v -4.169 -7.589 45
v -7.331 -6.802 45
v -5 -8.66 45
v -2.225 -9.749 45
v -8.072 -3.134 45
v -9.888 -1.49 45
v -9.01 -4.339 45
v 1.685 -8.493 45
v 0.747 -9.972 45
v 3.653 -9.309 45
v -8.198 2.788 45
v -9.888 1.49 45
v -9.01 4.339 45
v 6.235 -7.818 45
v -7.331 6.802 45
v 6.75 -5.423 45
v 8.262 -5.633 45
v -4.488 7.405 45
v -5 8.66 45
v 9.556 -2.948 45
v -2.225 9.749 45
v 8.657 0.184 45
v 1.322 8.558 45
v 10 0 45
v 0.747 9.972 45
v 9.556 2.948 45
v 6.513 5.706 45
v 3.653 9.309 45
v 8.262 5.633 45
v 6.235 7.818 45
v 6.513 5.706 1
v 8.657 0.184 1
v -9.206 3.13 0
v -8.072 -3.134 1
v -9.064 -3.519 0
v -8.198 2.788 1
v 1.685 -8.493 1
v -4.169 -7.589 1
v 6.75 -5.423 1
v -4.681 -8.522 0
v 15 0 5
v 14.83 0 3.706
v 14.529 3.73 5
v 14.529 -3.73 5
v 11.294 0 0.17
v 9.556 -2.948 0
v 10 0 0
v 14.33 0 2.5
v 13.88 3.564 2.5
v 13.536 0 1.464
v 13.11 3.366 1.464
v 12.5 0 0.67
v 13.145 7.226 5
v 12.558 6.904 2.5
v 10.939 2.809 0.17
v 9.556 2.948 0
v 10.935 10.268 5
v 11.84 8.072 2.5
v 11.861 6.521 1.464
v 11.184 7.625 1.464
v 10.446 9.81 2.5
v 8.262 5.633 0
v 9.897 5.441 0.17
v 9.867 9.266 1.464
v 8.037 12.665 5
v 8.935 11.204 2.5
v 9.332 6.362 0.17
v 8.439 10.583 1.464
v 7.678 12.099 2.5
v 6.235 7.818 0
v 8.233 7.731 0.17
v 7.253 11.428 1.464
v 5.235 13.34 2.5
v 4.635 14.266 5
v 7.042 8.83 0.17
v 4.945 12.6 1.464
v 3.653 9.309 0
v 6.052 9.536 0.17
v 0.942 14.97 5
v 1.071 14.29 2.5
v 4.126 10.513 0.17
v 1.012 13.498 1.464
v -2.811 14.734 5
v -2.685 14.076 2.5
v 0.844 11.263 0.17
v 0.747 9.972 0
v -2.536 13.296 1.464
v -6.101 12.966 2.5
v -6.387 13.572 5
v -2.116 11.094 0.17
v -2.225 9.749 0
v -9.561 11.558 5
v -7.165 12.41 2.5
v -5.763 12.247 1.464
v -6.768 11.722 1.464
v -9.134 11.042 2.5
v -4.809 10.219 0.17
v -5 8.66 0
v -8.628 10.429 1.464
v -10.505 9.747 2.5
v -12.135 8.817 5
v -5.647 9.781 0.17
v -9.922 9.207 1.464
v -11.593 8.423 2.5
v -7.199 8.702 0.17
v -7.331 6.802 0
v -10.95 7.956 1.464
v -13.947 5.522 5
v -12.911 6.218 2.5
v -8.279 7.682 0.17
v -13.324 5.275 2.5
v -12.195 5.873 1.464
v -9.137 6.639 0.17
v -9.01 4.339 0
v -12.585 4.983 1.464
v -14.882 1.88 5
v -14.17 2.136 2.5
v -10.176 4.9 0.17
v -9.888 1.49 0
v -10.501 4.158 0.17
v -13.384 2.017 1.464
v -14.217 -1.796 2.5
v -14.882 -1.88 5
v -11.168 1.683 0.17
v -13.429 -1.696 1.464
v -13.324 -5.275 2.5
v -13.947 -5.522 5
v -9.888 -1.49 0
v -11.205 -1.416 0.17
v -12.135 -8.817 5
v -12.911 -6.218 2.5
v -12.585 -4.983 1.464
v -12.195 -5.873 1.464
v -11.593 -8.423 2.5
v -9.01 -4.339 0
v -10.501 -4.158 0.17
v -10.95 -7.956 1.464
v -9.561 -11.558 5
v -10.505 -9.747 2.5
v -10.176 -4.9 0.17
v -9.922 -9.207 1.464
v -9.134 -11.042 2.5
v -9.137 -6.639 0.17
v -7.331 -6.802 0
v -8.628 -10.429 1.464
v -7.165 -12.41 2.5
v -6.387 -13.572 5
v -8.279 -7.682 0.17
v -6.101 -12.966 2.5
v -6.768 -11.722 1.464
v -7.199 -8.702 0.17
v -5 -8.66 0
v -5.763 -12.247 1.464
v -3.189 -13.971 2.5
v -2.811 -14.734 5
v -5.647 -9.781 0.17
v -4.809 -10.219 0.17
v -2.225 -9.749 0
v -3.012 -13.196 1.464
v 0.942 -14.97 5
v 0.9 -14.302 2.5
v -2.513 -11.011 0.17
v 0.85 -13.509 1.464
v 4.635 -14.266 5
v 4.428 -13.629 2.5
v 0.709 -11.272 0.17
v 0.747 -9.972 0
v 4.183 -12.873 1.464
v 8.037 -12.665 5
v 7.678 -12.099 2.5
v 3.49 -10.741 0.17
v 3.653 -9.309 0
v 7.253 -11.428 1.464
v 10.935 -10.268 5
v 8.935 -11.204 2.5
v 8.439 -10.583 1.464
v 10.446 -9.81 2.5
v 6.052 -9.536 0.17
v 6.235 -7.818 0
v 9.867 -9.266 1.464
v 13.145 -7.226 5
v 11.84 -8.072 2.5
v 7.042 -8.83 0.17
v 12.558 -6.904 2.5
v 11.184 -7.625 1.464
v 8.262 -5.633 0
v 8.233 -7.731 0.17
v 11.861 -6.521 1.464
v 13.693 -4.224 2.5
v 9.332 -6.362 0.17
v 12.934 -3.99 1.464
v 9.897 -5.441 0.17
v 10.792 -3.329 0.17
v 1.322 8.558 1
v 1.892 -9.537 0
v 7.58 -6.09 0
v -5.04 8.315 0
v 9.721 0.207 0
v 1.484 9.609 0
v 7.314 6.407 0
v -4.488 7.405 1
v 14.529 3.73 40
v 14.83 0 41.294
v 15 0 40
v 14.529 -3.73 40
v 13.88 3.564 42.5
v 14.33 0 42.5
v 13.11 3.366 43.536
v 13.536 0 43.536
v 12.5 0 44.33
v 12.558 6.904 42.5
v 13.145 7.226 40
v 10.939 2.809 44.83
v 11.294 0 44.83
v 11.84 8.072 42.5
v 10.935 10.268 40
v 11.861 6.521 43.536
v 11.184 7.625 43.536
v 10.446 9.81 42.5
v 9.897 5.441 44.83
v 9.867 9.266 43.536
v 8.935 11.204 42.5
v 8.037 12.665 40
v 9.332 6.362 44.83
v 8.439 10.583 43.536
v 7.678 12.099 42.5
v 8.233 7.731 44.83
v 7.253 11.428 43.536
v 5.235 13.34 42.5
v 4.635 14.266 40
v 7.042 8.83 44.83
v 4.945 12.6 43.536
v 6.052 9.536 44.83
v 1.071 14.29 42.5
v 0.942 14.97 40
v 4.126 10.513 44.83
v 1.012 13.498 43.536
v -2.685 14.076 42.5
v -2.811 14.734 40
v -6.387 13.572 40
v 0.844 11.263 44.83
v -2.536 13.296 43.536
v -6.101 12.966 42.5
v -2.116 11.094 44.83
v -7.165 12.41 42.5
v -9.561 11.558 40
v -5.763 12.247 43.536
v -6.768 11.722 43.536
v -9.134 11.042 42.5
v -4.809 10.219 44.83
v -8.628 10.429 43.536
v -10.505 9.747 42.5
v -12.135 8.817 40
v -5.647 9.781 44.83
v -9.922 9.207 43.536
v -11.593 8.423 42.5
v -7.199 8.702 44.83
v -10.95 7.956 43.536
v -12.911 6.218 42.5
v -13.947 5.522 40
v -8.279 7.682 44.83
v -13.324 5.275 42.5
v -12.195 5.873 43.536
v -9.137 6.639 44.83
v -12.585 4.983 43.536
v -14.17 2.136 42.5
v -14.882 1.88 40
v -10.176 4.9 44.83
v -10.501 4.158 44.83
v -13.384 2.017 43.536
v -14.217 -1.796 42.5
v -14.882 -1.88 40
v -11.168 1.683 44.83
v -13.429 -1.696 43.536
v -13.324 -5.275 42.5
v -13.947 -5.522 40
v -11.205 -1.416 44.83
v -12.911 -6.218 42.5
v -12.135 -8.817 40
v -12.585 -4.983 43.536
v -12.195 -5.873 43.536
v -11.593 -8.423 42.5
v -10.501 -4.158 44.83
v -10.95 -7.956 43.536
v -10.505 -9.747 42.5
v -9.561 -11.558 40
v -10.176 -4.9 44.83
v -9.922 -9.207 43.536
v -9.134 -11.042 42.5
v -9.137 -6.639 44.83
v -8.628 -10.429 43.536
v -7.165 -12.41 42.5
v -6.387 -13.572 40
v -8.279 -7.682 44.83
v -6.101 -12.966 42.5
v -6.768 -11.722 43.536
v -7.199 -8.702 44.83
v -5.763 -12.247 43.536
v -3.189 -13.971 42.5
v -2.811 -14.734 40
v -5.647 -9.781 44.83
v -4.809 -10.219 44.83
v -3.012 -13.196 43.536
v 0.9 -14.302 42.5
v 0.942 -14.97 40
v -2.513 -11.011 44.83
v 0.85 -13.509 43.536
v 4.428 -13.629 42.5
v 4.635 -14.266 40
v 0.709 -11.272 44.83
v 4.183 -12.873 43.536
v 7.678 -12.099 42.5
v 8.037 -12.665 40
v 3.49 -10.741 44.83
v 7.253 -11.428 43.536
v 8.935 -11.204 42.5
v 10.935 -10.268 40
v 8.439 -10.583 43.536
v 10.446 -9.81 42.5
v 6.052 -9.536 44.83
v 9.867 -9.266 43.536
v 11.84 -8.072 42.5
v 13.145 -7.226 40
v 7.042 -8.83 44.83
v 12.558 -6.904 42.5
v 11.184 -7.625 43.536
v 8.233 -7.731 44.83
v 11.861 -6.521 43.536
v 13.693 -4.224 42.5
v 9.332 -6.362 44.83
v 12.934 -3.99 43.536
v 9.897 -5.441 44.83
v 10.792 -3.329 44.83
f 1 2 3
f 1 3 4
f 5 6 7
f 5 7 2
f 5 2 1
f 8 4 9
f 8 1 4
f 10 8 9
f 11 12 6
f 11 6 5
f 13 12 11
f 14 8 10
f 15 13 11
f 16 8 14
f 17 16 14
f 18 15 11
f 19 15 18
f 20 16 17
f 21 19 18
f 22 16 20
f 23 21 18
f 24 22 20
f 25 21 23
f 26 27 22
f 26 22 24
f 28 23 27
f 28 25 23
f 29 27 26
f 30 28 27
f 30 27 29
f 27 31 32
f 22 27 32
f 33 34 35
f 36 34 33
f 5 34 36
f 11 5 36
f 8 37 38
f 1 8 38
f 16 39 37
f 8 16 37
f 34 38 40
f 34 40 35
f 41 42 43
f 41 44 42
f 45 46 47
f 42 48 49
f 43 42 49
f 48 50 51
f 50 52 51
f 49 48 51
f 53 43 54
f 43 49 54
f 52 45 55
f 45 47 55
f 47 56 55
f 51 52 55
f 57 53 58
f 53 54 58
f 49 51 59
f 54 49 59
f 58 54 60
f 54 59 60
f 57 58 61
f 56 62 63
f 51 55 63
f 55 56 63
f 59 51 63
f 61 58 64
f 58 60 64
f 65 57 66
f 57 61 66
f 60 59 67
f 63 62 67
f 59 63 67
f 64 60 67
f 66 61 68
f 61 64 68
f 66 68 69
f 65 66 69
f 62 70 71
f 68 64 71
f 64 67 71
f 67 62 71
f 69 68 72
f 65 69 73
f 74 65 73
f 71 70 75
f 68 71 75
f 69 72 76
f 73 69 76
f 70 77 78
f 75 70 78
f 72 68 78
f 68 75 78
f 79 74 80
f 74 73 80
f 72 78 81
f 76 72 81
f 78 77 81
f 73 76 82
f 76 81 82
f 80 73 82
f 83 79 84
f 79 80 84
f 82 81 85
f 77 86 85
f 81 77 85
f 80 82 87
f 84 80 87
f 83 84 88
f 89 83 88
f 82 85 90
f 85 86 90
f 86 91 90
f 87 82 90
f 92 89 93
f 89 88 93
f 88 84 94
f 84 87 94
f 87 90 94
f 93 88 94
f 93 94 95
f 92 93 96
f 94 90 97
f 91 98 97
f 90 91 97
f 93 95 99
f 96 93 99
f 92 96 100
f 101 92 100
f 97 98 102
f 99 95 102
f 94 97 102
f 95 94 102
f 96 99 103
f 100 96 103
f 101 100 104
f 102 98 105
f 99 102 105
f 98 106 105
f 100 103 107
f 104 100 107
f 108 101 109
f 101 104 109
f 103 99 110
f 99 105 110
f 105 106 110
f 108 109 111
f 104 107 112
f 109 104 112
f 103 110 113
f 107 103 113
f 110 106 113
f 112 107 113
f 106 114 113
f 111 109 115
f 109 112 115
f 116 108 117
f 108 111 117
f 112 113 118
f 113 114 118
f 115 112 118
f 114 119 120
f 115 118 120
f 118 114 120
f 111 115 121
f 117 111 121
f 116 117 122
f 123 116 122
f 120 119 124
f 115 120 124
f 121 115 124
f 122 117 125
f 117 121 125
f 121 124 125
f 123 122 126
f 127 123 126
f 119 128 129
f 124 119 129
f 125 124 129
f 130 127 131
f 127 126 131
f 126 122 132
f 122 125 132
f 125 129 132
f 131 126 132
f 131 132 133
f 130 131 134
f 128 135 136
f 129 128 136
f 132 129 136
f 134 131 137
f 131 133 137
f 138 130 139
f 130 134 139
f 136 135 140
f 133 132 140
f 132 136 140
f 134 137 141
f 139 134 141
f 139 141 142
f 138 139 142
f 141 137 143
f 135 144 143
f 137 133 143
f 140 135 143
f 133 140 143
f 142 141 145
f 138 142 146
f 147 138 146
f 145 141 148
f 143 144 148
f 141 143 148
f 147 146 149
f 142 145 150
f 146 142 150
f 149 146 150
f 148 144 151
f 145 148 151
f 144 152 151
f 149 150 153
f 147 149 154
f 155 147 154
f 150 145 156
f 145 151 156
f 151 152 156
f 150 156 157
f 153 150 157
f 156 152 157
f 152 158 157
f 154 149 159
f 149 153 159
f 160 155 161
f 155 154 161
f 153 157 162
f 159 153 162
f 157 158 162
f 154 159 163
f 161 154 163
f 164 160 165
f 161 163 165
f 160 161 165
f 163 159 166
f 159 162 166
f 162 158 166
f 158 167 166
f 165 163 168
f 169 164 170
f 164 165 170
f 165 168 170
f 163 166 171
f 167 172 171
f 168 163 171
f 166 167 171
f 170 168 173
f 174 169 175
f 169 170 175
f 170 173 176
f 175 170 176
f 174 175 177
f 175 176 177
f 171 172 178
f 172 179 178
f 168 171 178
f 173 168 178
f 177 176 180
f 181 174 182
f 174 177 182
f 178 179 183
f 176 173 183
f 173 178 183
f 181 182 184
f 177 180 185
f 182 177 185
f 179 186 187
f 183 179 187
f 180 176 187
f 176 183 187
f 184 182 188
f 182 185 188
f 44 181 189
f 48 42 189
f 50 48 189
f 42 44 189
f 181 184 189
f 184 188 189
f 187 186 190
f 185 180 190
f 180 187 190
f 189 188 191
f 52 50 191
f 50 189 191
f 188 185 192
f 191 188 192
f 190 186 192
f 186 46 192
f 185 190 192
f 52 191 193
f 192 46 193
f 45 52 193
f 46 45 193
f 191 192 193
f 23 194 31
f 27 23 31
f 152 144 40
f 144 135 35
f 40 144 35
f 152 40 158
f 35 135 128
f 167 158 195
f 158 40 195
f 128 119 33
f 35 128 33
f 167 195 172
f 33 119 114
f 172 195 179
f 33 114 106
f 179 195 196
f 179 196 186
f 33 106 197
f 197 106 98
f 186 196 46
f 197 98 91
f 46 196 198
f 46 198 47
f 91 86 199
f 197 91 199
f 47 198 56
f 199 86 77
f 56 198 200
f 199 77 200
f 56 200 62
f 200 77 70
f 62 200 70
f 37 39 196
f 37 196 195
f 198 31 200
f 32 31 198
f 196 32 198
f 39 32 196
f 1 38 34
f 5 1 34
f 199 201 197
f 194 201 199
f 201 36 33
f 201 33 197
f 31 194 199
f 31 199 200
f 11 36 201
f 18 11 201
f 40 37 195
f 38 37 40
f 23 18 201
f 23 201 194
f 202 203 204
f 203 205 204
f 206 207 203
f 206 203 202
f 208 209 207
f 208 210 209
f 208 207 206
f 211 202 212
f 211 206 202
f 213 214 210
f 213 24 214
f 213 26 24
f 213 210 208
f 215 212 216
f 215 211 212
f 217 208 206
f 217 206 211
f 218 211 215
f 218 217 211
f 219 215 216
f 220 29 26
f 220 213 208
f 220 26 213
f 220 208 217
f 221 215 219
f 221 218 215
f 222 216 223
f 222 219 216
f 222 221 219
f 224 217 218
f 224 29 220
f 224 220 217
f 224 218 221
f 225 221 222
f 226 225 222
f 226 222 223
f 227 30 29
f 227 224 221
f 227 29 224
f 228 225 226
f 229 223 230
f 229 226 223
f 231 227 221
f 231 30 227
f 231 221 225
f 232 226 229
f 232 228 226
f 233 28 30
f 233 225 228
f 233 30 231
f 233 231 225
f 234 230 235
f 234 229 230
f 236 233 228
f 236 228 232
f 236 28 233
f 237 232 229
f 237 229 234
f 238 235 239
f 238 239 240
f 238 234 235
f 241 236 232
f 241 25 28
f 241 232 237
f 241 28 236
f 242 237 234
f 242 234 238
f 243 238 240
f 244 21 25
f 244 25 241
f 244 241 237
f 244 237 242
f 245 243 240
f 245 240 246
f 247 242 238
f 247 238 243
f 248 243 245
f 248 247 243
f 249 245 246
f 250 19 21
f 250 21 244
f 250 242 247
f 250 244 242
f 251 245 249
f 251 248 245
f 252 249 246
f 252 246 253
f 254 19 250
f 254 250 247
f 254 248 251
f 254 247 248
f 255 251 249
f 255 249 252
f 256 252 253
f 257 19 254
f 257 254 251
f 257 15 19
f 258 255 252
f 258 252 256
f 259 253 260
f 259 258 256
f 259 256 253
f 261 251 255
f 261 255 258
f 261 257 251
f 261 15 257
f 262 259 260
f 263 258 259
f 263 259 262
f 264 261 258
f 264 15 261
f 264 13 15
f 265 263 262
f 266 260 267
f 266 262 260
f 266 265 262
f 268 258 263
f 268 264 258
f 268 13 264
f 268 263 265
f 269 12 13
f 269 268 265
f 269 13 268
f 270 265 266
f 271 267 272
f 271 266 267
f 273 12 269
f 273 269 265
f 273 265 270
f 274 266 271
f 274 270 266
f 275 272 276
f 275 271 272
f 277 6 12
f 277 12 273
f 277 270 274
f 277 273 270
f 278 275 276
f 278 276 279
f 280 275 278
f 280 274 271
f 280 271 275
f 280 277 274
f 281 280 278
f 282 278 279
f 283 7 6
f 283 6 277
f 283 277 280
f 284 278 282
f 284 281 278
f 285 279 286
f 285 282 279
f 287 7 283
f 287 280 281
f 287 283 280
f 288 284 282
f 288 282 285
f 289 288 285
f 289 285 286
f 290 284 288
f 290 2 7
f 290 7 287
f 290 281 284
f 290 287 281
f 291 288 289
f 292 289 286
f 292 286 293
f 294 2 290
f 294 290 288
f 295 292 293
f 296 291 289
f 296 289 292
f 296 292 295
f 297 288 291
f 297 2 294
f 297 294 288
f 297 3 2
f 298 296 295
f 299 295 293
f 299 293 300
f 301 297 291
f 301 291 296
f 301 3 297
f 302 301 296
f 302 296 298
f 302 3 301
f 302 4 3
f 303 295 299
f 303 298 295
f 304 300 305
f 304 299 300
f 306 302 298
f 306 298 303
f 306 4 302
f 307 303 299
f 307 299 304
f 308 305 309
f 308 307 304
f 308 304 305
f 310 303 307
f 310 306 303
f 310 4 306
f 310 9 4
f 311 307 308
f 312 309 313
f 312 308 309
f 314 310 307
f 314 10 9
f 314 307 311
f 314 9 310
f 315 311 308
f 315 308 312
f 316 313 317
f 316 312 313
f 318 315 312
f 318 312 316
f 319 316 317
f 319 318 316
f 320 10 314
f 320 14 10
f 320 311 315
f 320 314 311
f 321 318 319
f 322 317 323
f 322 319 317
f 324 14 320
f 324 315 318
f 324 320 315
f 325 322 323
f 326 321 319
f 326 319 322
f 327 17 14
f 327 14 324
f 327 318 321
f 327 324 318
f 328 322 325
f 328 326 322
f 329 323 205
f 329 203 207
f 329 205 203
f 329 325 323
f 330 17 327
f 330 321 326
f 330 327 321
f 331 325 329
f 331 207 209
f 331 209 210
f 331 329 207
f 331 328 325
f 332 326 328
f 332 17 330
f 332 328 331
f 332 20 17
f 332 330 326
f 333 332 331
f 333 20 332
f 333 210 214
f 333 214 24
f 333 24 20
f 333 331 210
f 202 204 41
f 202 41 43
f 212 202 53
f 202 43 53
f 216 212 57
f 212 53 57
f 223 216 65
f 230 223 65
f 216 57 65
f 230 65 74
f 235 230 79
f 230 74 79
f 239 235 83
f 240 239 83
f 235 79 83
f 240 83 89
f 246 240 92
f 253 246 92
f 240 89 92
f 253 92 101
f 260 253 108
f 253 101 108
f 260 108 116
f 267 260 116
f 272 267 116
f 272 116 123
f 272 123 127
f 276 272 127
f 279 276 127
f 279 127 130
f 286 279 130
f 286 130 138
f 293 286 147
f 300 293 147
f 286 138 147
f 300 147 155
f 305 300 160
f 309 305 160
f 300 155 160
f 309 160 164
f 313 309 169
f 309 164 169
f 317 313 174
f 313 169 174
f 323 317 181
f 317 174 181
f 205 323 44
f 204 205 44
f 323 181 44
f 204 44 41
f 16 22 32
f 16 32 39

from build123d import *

# Parameters (mm, degrees)
F0_R     = 15
F1_DEPTH = 45
F2_R     = 5
F3_SIZE  = 1


with BuildPart() as f1:
    # F0 (on Top) → F1 (new body)
    with BuildSketch(Plane.XY):
        Circle(F0_R)
        Polygon((-4.488197, 7.405002), (1.321685, 8.557517), (6.513136, 5.705876), (8.657018, 0.184391), (6.750185, -5.423372), (1.684866, -8.493479), (-4.168821, -7.589393), (-8.07187, -3.134146), (-8.198001, 2.787603), align=None, mode=Mode.SUBTRACT)
    extrude(amount=F1_DEPTH)

    # F2
    f2_edges = [f1.edges().sort_by_distance(p)[0] for p in [
        (-15, 0, 45),
        (-15, 0, 0),
    ]]
    fillet(f2_edges, radius=F2_R)

    # F3
    f3_edges = [f1.edges().sort_by_distance(p)[0] for p in [
        (4.217525, -6.958425, 0),
        (-1.241978, -8.041436, 0),
        (-6.120346, -5.361769, 0),
        (-8.134936, -0.173271, 0),
        (-6.343099, 5.096302, 0),
        (-1.583256, 7.98126, 0),
        (3.917411, 7.131697, 0),
        (7.585077, 2.945134, 0),
        (7.703601, -2.61949, 0),
    ]]
    chamfer(f3_edges, length=F3_SIZE)


solid = f1.part
